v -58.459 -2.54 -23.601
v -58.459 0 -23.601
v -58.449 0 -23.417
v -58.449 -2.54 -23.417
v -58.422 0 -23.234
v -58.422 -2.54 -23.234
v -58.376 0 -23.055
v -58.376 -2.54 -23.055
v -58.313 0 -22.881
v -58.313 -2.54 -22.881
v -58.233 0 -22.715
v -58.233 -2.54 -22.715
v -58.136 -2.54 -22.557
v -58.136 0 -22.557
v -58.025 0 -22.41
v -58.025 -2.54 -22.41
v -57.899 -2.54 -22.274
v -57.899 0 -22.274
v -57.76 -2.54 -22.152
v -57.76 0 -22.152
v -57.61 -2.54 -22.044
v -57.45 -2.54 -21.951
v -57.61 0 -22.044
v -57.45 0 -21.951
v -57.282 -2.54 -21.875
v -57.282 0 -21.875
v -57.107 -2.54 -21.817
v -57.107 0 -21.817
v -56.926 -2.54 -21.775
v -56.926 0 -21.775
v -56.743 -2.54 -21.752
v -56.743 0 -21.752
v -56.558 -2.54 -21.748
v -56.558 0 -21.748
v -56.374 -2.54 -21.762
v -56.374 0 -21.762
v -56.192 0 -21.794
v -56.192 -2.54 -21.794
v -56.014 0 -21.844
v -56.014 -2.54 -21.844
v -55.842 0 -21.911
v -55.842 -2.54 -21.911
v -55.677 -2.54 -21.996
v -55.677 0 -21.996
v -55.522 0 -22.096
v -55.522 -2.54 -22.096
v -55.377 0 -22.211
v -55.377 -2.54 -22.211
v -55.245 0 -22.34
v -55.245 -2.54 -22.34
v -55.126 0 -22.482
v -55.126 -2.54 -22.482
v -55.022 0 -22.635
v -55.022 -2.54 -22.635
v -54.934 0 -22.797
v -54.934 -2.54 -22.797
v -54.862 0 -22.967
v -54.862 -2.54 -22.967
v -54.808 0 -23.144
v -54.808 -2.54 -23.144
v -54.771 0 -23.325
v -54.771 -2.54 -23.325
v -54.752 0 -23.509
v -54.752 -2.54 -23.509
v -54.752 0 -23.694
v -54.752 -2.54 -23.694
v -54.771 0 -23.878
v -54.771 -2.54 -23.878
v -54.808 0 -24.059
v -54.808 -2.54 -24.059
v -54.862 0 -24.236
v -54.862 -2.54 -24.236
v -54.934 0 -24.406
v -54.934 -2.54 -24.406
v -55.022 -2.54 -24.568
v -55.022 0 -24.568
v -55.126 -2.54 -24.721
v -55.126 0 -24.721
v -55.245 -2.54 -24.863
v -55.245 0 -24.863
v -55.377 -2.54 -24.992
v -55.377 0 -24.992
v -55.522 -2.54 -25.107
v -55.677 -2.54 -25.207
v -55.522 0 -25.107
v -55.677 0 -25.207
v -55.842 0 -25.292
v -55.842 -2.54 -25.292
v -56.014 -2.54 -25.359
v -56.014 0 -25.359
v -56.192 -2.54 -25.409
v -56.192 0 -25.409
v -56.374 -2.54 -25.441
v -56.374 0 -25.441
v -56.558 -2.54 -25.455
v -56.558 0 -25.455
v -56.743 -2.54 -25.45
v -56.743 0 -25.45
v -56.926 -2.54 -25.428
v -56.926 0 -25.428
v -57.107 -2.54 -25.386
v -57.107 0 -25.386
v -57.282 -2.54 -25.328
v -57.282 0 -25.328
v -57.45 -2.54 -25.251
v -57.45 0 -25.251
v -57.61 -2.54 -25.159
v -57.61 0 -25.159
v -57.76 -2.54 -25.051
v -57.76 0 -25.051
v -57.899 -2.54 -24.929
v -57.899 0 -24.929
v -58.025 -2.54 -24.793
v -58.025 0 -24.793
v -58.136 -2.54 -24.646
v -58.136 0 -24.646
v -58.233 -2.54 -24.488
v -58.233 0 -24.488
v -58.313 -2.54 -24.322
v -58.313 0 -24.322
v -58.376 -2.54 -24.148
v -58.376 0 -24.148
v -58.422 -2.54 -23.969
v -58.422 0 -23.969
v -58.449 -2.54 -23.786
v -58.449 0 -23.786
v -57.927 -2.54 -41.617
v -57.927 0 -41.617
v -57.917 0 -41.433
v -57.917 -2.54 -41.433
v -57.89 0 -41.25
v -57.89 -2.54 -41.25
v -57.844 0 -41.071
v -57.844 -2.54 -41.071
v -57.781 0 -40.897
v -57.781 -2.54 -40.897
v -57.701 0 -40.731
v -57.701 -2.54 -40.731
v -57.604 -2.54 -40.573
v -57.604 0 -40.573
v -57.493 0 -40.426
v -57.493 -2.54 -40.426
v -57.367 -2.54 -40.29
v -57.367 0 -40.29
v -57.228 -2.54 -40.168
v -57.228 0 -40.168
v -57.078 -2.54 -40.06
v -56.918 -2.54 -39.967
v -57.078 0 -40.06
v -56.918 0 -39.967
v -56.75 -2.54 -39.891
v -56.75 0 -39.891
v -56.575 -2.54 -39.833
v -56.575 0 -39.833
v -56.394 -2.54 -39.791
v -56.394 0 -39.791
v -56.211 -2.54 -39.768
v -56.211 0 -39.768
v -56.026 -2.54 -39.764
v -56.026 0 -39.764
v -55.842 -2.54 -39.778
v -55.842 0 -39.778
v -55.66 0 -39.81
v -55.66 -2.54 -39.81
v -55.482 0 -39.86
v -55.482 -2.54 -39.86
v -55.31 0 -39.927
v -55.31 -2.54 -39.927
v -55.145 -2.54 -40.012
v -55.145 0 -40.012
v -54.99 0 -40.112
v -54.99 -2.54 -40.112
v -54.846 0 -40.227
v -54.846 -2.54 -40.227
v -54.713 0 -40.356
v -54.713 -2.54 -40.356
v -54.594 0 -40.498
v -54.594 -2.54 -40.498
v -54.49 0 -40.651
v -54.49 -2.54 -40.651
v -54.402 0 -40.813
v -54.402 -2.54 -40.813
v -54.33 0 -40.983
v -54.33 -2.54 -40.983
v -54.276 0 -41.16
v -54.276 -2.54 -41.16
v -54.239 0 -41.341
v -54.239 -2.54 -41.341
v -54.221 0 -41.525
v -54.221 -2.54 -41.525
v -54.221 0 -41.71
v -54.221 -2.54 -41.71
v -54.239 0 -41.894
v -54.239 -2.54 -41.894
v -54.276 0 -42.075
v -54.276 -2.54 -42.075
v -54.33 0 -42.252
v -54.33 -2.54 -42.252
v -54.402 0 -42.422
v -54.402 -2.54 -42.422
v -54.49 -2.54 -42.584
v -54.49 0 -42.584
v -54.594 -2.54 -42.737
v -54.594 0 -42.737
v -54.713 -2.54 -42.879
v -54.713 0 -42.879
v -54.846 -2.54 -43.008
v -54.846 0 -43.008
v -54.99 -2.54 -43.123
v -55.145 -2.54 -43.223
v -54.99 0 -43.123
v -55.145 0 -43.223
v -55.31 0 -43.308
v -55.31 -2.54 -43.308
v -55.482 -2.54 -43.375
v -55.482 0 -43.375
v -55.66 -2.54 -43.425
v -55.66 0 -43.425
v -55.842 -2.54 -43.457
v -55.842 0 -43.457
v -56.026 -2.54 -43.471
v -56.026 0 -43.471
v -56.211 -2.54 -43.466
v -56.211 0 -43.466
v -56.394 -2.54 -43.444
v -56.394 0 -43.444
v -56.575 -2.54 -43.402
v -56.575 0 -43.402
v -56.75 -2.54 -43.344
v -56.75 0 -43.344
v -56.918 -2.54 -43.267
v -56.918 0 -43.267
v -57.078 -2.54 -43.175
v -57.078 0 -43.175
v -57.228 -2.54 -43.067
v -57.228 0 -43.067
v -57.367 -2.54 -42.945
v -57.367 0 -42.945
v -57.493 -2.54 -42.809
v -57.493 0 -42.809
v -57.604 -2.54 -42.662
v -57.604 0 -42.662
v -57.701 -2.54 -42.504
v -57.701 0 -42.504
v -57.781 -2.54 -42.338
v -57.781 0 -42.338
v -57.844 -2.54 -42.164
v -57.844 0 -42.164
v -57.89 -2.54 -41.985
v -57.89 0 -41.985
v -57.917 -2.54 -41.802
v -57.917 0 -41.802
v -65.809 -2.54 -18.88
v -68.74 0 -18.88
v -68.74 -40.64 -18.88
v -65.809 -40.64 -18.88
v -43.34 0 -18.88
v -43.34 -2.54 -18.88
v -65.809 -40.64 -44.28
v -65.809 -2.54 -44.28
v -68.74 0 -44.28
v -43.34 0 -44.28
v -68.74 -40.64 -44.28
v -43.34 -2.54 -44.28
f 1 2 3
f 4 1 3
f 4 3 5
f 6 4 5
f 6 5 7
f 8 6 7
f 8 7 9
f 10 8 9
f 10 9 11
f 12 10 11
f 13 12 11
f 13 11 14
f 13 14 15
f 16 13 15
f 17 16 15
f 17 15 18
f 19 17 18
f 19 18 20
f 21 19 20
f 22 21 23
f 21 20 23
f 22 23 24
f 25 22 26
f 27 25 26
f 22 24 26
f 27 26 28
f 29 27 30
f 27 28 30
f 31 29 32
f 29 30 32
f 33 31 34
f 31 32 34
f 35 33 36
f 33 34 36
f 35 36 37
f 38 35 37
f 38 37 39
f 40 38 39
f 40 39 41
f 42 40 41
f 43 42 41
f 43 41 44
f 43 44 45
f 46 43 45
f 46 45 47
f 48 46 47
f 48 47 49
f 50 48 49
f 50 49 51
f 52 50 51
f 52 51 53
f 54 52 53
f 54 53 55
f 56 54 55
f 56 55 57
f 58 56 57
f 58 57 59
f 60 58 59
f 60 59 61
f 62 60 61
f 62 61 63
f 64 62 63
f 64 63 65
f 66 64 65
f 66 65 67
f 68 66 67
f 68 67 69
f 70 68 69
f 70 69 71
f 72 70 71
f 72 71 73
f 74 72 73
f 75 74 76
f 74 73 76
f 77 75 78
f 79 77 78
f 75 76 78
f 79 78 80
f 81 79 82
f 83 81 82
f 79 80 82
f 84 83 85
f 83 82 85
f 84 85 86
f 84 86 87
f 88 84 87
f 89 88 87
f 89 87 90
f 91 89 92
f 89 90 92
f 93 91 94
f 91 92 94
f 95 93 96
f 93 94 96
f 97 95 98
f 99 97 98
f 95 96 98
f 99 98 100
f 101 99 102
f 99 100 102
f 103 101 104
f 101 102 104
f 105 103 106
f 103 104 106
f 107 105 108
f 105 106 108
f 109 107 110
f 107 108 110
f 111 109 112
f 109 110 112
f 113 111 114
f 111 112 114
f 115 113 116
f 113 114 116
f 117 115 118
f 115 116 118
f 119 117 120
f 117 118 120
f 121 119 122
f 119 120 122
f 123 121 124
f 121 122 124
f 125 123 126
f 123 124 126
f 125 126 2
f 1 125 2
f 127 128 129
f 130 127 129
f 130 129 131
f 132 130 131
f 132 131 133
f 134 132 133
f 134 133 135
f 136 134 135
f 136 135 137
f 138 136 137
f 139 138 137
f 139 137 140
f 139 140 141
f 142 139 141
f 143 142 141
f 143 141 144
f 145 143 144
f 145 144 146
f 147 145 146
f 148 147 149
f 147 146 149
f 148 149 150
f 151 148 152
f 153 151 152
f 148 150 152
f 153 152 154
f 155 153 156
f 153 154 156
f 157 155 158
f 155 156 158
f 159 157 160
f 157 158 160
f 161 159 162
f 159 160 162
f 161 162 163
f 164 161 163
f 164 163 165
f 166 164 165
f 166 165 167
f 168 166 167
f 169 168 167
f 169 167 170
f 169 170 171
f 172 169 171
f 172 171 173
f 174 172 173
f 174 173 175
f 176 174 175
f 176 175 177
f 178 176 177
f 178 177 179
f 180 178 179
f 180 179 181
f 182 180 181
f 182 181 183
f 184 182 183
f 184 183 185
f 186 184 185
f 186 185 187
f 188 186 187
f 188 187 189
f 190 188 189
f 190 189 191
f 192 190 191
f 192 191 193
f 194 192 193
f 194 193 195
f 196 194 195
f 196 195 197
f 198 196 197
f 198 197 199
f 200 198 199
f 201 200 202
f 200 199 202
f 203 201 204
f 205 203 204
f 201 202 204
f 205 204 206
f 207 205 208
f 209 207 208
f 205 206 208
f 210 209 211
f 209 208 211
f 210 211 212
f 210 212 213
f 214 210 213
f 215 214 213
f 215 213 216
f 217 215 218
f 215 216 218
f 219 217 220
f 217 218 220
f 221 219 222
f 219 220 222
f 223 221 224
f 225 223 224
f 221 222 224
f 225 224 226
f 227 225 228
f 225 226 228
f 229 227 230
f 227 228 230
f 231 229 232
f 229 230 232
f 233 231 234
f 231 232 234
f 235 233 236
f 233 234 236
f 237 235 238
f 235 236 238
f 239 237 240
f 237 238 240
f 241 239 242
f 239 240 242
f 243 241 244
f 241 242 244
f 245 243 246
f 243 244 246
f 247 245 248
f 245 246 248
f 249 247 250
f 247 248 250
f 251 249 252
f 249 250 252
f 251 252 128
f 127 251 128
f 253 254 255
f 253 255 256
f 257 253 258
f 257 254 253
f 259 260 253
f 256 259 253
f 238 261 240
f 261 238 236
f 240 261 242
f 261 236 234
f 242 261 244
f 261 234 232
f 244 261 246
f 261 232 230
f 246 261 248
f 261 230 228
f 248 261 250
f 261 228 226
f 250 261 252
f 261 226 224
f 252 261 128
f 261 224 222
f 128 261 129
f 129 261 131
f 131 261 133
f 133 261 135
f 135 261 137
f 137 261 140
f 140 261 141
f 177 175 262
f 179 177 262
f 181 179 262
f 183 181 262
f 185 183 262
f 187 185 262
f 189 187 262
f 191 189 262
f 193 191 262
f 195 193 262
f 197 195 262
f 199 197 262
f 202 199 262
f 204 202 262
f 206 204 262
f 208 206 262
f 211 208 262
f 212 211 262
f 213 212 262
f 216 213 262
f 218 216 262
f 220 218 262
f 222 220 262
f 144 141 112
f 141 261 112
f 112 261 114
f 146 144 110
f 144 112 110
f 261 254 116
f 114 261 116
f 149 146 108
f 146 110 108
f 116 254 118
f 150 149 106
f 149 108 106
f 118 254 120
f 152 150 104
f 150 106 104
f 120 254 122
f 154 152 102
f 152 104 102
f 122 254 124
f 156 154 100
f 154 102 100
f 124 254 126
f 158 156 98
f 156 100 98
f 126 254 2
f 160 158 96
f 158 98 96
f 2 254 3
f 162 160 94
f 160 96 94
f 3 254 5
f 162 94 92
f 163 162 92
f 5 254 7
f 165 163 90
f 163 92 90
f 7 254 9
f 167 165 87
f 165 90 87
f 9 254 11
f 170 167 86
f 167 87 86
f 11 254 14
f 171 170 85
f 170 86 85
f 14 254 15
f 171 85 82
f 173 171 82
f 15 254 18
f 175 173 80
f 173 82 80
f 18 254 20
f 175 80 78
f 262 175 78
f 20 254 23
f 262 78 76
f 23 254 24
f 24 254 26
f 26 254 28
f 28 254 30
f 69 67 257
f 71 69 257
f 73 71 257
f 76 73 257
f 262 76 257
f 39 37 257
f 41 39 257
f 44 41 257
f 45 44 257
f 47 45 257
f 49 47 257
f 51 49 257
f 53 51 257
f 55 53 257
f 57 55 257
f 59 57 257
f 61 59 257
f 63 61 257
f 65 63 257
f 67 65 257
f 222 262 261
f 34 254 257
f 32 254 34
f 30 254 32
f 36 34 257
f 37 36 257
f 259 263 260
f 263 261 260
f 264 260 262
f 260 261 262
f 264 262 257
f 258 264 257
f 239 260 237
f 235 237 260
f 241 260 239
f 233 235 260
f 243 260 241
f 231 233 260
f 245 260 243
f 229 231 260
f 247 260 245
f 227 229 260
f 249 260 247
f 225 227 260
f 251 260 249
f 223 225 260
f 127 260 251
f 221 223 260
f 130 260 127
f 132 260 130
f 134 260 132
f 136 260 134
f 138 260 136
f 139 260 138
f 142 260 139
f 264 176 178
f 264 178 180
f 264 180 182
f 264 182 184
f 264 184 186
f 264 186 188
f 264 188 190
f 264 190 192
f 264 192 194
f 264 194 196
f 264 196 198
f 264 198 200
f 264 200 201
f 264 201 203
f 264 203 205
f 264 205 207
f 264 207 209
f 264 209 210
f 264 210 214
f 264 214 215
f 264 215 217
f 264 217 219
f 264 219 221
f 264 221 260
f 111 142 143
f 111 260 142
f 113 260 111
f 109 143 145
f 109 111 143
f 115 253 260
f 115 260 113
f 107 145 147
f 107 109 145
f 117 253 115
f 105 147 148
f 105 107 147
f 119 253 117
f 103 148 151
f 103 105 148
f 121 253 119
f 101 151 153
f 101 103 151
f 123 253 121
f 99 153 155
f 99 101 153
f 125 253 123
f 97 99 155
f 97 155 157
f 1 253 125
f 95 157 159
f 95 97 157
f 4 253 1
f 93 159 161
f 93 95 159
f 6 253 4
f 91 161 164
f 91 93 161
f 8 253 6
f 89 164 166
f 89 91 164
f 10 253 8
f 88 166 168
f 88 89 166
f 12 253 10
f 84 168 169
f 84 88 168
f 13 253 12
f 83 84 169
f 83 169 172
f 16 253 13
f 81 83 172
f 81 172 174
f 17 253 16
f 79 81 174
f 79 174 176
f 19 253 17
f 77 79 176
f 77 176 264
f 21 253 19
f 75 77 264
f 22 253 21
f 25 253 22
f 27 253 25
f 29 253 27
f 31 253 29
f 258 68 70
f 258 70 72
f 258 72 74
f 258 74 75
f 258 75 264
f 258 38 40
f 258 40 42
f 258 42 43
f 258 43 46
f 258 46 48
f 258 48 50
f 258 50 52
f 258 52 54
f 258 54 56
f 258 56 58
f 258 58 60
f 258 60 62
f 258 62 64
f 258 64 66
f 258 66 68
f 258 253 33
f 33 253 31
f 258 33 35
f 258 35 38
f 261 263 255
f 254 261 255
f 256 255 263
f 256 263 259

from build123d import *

# Parameters (mm, degrees)
F0_W      = 25.4
F0_H      = 24.1169882938
F1_DEPTH  = 2.54
F0_H_2    = 25.4
F2_W      = 2.9306858778
F2_H      = 25.4
F4_DEPTH  = 38.1
F3_W      = 2.9306774
F3_H      = 24.1169882938
F6_D      = 3.7084
F6_DEPTH  = 12.7
F6_TIP    = 1.1141157598
F8_D      = 3.7084
F8_DEPTH  = 12.7
F8_TIP    = 1.1141157598
F11_D     = 3.7084
F11_DEPTH = 12.7
F11_TIP   = 1.1141157598


with BuildPart() as f1:
    # F0 (on Front) → F1 (new body)
    with BuildSketch(Plane.XZ):
        with Locations((25.2723555684, -23.3813137747)):
            Rectangle(F0_W, F0_H)
    extrude(amount=F1_DEPTH)

    # F3 (on face) → F4, piece 2 (join)
    with BuildSketch(Plane.XZ.offset(2.54)):
        with Locations((36.5070168684, -23.3813137747)):
            Rectangle(F3_W, F3_H)
    extrude(amount=F4_DEPTH)

    # F8
    with Locations(Plane.XZ.offset(2.54)):
        with Locations((24.4828648865, -16.1586906761)):
            Hole(F8_D / 2, depth=F8_DEPTH)
            with Locations((0, 0, -(F8_DEPTH + F8_TIP / 2))):  # 118° drill point
                Cone(0, F8_D / 2, F8_TIP, mode=Mode.SUBTRACT)


with BuildPart() as f1b:
    # F0 (on Front) → F1, piece 2 (new body)
    with BuildSketch(Plane.XZ):
        with Locations((-56.0397792935, -31.5795045674)):
            Rectangle(F0_W, F0_H_2)
    extrude(amount=F1_DEPTH)

    # F2 (on face) → F4 (join)
    with BuildSketch(Plane.XZ.offset(2.54)):
        with Locations((-67.2744363546, -31.5795045674)):
            Rectangle(F2_W, F2_H)
    extrude(amount=F4_DEPTH)

    # F6
    with Locations(Plane.XZ.offset(2.54)):
        with Locations((-56.6043816507, -23.6014798284)):
            Hole(F6_D / 2, depth=F6_DEPTH)
            with Locations((0, 0, -(F6_DEPTH + F6_TIP / 2))):  # 118° drill point
                Cone(0, F6_D / 2, F6_TIP, mode=Mode.SUBTRACT)

    # F11
    with Locations(Plane.XZ.offset(2.54)):
        with Locations((-56.0724250972, -41.6174791753)):
            Hole(F11_D / 2, depth=F11_DEPTH)
            with Locations((0, 0, -(F11_DEPTH + F11_TIP / 2))):  # 118° drill point
                Cone(0, F11_D / 2, F11_TIP, mode=Mode.SUBTRACT)


solid = f1b.part
